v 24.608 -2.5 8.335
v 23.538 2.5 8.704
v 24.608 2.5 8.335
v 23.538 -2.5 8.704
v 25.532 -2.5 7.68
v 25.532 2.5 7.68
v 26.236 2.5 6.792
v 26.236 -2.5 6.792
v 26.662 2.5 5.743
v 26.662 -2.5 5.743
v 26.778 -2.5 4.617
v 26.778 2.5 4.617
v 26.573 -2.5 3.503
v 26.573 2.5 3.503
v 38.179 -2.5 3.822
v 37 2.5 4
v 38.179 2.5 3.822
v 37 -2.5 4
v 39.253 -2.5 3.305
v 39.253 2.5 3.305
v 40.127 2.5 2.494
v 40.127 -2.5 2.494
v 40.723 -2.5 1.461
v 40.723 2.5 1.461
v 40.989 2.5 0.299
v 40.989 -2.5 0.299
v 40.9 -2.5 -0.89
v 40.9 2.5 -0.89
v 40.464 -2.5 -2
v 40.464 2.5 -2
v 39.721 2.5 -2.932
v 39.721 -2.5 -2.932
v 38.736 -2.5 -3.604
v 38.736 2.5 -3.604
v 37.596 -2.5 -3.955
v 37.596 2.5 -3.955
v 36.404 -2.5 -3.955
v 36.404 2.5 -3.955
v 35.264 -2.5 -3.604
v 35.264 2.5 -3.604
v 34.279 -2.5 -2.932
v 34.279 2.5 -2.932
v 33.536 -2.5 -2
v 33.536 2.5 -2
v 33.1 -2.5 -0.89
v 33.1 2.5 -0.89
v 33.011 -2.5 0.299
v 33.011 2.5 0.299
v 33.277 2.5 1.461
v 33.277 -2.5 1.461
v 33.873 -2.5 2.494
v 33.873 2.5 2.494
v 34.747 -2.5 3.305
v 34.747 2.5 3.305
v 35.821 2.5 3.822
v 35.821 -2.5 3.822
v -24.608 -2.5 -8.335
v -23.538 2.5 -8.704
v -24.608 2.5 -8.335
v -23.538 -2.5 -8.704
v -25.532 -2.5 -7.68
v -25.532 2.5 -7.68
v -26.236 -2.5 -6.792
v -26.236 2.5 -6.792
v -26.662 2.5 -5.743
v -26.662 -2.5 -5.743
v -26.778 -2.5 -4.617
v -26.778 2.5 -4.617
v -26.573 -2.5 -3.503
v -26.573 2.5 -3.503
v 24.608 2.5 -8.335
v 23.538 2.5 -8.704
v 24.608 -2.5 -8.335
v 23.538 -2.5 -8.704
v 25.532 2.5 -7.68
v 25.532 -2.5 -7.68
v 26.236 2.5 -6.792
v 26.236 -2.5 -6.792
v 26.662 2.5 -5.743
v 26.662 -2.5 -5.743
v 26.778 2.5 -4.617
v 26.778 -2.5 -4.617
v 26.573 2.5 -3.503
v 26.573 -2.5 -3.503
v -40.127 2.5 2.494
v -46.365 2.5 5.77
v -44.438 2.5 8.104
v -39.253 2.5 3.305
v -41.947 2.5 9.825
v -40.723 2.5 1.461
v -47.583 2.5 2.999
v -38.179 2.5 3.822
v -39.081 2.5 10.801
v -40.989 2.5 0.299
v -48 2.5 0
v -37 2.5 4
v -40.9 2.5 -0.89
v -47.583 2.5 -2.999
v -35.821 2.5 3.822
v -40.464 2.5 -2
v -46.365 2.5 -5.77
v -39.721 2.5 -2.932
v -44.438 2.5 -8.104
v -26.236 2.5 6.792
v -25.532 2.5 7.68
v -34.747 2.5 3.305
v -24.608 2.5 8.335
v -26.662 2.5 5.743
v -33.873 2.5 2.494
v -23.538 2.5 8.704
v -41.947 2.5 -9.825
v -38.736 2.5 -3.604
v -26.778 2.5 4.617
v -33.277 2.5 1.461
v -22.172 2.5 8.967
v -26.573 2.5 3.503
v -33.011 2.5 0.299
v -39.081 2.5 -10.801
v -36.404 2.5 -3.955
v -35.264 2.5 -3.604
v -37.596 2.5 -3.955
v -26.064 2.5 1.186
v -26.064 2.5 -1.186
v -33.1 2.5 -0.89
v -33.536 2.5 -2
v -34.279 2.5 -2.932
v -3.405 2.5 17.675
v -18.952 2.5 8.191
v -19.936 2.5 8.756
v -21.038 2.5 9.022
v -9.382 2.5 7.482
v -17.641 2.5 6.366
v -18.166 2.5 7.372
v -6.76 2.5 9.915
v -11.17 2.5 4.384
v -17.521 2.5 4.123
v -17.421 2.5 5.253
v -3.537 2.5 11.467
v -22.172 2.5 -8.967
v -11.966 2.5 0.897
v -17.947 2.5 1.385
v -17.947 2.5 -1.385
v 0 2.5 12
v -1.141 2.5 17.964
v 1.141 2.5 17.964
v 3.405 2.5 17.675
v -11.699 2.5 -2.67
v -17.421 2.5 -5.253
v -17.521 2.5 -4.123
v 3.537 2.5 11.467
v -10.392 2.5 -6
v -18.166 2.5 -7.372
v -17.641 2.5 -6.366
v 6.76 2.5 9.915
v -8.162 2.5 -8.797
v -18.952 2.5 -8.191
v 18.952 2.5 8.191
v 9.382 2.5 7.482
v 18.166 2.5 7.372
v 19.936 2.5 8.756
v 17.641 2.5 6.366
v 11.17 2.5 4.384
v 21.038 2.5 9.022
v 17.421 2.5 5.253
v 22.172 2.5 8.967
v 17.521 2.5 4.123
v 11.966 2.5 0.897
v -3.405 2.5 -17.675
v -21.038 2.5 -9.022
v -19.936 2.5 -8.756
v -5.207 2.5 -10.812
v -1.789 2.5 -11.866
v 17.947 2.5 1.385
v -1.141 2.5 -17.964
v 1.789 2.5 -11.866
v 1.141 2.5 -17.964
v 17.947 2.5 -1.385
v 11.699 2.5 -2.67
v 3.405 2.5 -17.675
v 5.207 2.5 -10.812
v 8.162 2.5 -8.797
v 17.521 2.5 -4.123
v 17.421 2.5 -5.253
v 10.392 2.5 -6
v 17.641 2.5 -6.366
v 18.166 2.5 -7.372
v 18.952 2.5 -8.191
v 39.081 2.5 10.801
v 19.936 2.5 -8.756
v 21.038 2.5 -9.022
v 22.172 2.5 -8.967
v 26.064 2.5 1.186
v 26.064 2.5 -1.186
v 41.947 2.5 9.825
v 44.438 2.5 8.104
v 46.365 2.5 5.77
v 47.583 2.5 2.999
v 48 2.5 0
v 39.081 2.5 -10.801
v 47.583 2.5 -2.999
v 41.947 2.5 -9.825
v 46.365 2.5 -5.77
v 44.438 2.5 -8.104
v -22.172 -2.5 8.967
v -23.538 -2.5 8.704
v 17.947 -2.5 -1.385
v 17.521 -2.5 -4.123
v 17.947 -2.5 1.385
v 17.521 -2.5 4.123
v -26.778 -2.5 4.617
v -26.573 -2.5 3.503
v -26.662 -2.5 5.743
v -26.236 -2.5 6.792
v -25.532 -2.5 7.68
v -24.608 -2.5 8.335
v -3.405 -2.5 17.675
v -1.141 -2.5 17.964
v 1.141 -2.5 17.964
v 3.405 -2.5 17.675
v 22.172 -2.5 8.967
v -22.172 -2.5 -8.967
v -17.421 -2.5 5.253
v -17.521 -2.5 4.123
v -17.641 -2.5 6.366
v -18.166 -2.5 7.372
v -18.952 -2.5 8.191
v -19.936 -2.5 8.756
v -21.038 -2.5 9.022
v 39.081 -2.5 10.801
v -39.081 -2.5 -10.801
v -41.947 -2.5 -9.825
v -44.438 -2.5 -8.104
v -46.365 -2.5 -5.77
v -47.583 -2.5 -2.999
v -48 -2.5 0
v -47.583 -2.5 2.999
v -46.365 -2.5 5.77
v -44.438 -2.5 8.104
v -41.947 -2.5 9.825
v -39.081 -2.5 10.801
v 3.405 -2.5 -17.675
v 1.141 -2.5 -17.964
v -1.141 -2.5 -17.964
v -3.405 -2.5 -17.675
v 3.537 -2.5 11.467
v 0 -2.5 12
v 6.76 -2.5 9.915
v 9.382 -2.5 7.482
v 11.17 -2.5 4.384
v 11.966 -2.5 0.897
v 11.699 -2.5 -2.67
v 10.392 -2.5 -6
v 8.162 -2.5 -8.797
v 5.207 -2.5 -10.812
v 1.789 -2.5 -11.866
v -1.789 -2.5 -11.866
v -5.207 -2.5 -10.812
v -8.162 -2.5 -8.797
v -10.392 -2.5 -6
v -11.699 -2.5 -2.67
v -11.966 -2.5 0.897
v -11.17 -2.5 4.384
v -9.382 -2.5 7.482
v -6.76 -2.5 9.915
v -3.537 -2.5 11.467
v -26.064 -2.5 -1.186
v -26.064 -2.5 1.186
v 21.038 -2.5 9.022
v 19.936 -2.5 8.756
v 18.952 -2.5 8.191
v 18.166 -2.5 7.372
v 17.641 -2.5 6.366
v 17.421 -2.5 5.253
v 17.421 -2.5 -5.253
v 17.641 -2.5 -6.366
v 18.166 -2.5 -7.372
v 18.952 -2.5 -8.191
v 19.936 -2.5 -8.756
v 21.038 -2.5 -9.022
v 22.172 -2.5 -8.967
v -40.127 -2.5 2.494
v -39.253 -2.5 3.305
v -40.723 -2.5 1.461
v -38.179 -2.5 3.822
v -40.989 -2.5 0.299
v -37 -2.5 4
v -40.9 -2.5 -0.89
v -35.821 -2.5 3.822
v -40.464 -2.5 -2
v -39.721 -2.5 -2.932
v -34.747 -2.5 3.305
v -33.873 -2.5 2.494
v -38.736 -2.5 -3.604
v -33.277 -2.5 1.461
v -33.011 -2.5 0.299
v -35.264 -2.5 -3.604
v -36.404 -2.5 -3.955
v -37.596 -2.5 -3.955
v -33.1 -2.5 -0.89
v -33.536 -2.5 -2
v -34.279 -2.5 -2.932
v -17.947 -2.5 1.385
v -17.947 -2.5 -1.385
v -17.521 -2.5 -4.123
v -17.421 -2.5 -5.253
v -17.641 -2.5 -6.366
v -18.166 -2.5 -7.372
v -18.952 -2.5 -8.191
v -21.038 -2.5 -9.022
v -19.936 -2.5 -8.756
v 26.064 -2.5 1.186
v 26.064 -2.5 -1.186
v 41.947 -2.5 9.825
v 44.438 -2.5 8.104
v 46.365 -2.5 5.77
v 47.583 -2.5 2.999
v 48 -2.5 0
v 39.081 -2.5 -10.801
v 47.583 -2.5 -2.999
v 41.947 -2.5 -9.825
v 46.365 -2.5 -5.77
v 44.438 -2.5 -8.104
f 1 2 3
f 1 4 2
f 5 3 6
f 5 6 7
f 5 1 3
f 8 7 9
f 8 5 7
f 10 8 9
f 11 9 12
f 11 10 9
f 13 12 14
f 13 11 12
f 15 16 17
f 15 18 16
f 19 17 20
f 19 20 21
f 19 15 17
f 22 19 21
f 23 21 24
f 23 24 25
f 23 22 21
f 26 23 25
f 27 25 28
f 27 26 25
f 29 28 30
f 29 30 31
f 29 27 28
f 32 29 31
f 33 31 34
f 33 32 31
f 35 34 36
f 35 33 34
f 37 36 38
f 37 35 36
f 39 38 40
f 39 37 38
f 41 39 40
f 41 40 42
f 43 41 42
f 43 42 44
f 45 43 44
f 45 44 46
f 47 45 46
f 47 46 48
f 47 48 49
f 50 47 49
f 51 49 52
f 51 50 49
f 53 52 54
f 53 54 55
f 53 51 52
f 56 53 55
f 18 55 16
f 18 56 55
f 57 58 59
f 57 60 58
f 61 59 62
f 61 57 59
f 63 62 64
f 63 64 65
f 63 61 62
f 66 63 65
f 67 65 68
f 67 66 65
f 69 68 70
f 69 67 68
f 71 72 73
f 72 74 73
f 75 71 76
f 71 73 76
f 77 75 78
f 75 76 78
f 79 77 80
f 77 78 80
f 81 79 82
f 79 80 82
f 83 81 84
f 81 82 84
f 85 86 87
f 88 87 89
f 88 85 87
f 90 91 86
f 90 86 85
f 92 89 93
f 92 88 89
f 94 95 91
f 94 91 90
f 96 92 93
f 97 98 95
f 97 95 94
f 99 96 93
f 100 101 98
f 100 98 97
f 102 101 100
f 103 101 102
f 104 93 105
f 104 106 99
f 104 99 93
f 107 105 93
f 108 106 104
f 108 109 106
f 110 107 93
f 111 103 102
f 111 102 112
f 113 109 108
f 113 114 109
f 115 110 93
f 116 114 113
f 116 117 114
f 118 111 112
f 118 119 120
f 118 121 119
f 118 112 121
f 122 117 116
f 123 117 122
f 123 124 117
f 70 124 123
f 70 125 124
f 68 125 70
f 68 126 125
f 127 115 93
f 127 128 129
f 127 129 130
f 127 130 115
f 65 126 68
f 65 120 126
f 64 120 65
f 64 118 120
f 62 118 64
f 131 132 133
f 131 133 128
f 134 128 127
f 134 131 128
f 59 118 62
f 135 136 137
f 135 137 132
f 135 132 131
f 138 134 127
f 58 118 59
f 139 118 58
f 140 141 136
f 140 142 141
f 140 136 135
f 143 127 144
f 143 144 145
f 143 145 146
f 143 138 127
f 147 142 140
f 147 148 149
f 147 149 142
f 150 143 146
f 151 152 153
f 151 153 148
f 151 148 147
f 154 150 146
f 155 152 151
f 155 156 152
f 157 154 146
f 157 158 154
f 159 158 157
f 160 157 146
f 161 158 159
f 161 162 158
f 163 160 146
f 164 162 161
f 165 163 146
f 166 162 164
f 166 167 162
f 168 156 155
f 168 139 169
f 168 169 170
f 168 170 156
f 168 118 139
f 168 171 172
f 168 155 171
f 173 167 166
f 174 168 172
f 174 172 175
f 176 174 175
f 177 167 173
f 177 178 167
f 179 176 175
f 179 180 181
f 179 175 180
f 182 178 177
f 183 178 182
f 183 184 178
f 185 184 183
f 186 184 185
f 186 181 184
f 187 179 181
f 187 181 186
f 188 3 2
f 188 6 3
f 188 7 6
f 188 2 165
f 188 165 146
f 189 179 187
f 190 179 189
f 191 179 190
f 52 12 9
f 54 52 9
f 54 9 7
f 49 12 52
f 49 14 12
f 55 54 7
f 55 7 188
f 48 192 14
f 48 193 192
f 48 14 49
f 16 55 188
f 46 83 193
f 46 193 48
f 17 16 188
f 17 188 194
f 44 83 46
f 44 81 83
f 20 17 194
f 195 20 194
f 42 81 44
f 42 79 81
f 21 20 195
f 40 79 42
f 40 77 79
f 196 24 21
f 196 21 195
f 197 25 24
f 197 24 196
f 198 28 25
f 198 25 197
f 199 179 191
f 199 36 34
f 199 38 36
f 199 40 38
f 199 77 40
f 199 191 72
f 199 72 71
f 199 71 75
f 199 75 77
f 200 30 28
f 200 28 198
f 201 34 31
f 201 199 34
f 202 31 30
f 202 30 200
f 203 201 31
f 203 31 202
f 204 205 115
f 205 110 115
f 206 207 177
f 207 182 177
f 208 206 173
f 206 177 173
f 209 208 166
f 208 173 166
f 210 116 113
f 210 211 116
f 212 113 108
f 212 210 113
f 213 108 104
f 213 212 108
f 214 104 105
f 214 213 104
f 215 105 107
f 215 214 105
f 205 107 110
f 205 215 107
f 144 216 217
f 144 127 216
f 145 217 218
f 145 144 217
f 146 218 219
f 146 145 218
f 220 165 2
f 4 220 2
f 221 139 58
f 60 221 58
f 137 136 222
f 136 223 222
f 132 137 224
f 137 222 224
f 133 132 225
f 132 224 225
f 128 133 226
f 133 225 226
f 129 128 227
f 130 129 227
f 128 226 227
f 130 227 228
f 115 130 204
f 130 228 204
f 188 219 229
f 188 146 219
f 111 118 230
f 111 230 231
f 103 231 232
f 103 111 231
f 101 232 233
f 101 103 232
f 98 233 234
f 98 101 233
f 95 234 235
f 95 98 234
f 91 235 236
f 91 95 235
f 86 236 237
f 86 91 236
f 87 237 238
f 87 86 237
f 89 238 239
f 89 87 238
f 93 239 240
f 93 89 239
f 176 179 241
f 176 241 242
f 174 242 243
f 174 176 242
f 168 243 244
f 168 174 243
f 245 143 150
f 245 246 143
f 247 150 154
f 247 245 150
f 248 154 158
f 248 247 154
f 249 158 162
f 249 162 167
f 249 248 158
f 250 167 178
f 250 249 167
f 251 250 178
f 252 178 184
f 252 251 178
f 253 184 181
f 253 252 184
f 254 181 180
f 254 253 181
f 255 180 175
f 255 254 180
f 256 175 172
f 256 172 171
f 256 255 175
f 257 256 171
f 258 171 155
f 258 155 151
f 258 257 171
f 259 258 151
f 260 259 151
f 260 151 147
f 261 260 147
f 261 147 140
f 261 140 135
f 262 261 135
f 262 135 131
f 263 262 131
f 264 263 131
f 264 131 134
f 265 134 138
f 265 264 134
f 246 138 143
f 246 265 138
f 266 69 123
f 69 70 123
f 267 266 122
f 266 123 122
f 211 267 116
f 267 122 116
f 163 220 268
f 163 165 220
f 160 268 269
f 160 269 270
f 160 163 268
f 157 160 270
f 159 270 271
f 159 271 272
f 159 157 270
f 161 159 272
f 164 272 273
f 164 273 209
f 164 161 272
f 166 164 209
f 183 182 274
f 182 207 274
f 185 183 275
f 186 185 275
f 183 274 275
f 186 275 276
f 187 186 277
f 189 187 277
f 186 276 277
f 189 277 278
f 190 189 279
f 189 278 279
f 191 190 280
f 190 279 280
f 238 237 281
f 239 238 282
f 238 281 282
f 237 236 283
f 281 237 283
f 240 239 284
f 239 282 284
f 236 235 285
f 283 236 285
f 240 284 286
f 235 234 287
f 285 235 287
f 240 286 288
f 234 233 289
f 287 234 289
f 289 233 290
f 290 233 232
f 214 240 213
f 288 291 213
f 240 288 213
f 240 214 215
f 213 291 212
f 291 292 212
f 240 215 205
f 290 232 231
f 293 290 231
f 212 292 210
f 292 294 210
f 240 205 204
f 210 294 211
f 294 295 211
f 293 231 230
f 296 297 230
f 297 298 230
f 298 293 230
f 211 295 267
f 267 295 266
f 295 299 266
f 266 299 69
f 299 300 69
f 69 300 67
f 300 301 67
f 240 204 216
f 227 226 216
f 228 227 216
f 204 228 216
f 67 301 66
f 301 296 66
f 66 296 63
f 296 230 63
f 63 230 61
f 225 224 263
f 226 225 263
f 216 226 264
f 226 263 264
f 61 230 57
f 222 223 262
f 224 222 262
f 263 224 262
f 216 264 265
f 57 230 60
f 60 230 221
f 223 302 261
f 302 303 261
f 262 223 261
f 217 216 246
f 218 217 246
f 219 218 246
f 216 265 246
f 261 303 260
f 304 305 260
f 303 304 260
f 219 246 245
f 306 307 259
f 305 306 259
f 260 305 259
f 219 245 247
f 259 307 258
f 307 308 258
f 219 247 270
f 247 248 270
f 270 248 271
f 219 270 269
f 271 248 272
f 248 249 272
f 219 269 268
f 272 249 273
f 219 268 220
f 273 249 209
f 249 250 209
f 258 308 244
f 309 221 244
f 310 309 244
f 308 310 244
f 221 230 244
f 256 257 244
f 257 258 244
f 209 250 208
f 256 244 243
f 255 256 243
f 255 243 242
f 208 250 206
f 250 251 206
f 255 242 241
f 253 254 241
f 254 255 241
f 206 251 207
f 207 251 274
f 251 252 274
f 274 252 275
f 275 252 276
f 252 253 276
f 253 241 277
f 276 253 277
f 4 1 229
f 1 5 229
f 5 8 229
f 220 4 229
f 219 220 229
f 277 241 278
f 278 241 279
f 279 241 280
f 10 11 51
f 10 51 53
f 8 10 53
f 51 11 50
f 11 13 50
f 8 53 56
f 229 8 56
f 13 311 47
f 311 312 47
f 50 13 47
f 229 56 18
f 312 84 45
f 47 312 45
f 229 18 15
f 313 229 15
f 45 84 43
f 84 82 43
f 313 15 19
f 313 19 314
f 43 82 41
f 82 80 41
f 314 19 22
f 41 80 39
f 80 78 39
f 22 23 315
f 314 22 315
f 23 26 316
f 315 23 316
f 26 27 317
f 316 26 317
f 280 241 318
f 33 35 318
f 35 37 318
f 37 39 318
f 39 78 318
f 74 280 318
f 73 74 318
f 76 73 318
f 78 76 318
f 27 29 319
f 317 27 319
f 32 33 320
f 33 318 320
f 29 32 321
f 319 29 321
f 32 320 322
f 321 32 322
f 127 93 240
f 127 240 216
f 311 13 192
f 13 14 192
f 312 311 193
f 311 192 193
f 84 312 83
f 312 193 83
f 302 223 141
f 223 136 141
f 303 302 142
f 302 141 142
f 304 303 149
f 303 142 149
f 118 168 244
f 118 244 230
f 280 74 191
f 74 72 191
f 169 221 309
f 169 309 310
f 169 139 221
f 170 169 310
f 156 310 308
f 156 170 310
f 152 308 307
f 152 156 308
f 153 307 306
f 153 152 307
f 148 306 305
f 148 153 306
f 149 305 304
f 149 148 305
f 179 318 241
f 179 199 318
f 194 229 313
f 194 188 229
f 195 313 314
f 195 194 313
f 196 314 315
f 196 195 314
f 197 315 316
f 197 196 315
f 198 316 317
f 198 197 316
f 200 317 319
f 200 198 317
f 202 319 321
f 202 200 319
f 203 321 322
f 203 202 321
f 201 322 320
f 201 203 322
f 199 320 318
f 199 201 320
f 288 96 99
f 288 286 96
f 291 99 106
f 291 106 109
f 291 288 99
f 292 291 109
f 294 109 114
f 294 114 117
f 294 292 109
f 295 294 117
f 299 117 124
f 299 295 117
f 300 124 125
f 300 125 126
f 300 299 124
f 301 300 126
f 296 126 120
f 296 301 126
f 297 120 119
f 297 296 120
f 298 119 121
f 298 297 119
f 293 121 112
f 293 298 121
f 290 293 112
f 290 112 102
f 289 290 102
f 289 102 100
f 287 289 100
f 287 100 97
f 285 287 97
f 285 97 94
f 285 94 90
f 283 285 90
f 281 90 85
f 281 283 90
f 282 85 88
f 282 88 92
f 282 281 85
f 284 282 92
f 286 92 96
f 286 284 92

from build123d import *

# Parameters (mm, degrees)
SKETCH1_R           = 4
SKETCH1_R_2         = 12
BOSS_EXTRUDE1_DEPTH = 2.5
FILLET1_R           = 4


with BuildPart() as part:
    # Sketch1 → Boss-Extrude1 (new, symmetric)
    with BuildSketch(Plane(origin=(0, 0, 0), x_dir=(1, 0, 0), z_dir=(0, 1, 0))):
        with BuildLine():
            Line((39.081081081, 10.801347209), (3.405405405, 17.674931797))
            ThreePointArc((3.405405405, 17.674931797), (0, 18), (-3.405405405, 17.674931797))
            Line((-3.405405405, 17.674931797), (-39.081081081, 10.801347209))
            ThreePointArc((-39.081081081, 10.801347209), (-48, 0), (-39.081081081, -10.801347209))
            Line((-39.081081081, -10.801347209), (-3.405405405, -17.674931797))
            ThreePointArc((-3.405405405, -17.674931797), (0, -18), (3.405405405, -17.674931797))
            Line((3.405405405, -17.674931797), (39.081081081, -10.801347209))
            ThreePointArc((39.081081081, -10.801347209), (48, 0), (39.081081081, 10.801347209))
        make_face()
        with Locations(Location((37, 0, 0), (0, 0, 270))):
            Circle(SKETCH1_R, mode=Mode.SUBTRACT)
        with Locations(Location((-37, 0, 0), (0, 0, 270))):
            Circle(SKETCH1_R, mode=Mode.SUBTRACT)
        with Locations(Location((0, 0, 0), (0, 0, 270))):
            Circle(SKETCH1_R_2, mode=Mode.SUBTRACT)
        with BuildLine():
            Line((-29.082089608, -7.635882073), (-14.68452203, -10.40984211))
            ThreePointArc((-14.68452203, -10.40984211), (-18, 0), (-14.68452203, 10.40984211))
            Line((-14.68452203, 10.40984211), (-29.082089608, 7.635882073))
            ThreePointArc((-29.082089608, 7.635882073), (-26, 0), (-29.082089608, -7.635882073))
        make_face(mode=Mode.SUBTRACT)
        with BuildLine():
            ThreePointArc((29.082089608, -7.635882073), (26, 0), (29.082089608, 7.635882073))
            Line((29.082089608, 7.635882073), (14.68452203, 10.40984211))
            ThreePointArc((14.68452203, 10.40984211), (18, 0), (14.68452203, -10.40984211))
            Line((14.68452203, -10.40984211), (29.082089608, -7.635882073))
        make_face(mode=Mode.SUBTRACT)
    extrude(amount=BOSS_EXTRUDE1_DEPTH, both=True)

    # Fillet1
    fillet1_edges = [part.edges().sort_by_distance(p)[0] for p in [
        (29.082089608, 0, -7.635882073),
        (14.68452203, 0, -10.40984211),
        (14.68452203, 0, 10.40984211),
        (29.082089608, 0, 7.635882073),
        (-14.68452203, 0, 10.40984211),
        (-14.68452203, 0, -10.40984211),
        (-29.082089608, 0, -7.635882073),
        (-29.082089608, 0, 7.635882073),
    ]]
    fillet(fillet1_edges, radius=FILLET1_R)


solid = part.part
